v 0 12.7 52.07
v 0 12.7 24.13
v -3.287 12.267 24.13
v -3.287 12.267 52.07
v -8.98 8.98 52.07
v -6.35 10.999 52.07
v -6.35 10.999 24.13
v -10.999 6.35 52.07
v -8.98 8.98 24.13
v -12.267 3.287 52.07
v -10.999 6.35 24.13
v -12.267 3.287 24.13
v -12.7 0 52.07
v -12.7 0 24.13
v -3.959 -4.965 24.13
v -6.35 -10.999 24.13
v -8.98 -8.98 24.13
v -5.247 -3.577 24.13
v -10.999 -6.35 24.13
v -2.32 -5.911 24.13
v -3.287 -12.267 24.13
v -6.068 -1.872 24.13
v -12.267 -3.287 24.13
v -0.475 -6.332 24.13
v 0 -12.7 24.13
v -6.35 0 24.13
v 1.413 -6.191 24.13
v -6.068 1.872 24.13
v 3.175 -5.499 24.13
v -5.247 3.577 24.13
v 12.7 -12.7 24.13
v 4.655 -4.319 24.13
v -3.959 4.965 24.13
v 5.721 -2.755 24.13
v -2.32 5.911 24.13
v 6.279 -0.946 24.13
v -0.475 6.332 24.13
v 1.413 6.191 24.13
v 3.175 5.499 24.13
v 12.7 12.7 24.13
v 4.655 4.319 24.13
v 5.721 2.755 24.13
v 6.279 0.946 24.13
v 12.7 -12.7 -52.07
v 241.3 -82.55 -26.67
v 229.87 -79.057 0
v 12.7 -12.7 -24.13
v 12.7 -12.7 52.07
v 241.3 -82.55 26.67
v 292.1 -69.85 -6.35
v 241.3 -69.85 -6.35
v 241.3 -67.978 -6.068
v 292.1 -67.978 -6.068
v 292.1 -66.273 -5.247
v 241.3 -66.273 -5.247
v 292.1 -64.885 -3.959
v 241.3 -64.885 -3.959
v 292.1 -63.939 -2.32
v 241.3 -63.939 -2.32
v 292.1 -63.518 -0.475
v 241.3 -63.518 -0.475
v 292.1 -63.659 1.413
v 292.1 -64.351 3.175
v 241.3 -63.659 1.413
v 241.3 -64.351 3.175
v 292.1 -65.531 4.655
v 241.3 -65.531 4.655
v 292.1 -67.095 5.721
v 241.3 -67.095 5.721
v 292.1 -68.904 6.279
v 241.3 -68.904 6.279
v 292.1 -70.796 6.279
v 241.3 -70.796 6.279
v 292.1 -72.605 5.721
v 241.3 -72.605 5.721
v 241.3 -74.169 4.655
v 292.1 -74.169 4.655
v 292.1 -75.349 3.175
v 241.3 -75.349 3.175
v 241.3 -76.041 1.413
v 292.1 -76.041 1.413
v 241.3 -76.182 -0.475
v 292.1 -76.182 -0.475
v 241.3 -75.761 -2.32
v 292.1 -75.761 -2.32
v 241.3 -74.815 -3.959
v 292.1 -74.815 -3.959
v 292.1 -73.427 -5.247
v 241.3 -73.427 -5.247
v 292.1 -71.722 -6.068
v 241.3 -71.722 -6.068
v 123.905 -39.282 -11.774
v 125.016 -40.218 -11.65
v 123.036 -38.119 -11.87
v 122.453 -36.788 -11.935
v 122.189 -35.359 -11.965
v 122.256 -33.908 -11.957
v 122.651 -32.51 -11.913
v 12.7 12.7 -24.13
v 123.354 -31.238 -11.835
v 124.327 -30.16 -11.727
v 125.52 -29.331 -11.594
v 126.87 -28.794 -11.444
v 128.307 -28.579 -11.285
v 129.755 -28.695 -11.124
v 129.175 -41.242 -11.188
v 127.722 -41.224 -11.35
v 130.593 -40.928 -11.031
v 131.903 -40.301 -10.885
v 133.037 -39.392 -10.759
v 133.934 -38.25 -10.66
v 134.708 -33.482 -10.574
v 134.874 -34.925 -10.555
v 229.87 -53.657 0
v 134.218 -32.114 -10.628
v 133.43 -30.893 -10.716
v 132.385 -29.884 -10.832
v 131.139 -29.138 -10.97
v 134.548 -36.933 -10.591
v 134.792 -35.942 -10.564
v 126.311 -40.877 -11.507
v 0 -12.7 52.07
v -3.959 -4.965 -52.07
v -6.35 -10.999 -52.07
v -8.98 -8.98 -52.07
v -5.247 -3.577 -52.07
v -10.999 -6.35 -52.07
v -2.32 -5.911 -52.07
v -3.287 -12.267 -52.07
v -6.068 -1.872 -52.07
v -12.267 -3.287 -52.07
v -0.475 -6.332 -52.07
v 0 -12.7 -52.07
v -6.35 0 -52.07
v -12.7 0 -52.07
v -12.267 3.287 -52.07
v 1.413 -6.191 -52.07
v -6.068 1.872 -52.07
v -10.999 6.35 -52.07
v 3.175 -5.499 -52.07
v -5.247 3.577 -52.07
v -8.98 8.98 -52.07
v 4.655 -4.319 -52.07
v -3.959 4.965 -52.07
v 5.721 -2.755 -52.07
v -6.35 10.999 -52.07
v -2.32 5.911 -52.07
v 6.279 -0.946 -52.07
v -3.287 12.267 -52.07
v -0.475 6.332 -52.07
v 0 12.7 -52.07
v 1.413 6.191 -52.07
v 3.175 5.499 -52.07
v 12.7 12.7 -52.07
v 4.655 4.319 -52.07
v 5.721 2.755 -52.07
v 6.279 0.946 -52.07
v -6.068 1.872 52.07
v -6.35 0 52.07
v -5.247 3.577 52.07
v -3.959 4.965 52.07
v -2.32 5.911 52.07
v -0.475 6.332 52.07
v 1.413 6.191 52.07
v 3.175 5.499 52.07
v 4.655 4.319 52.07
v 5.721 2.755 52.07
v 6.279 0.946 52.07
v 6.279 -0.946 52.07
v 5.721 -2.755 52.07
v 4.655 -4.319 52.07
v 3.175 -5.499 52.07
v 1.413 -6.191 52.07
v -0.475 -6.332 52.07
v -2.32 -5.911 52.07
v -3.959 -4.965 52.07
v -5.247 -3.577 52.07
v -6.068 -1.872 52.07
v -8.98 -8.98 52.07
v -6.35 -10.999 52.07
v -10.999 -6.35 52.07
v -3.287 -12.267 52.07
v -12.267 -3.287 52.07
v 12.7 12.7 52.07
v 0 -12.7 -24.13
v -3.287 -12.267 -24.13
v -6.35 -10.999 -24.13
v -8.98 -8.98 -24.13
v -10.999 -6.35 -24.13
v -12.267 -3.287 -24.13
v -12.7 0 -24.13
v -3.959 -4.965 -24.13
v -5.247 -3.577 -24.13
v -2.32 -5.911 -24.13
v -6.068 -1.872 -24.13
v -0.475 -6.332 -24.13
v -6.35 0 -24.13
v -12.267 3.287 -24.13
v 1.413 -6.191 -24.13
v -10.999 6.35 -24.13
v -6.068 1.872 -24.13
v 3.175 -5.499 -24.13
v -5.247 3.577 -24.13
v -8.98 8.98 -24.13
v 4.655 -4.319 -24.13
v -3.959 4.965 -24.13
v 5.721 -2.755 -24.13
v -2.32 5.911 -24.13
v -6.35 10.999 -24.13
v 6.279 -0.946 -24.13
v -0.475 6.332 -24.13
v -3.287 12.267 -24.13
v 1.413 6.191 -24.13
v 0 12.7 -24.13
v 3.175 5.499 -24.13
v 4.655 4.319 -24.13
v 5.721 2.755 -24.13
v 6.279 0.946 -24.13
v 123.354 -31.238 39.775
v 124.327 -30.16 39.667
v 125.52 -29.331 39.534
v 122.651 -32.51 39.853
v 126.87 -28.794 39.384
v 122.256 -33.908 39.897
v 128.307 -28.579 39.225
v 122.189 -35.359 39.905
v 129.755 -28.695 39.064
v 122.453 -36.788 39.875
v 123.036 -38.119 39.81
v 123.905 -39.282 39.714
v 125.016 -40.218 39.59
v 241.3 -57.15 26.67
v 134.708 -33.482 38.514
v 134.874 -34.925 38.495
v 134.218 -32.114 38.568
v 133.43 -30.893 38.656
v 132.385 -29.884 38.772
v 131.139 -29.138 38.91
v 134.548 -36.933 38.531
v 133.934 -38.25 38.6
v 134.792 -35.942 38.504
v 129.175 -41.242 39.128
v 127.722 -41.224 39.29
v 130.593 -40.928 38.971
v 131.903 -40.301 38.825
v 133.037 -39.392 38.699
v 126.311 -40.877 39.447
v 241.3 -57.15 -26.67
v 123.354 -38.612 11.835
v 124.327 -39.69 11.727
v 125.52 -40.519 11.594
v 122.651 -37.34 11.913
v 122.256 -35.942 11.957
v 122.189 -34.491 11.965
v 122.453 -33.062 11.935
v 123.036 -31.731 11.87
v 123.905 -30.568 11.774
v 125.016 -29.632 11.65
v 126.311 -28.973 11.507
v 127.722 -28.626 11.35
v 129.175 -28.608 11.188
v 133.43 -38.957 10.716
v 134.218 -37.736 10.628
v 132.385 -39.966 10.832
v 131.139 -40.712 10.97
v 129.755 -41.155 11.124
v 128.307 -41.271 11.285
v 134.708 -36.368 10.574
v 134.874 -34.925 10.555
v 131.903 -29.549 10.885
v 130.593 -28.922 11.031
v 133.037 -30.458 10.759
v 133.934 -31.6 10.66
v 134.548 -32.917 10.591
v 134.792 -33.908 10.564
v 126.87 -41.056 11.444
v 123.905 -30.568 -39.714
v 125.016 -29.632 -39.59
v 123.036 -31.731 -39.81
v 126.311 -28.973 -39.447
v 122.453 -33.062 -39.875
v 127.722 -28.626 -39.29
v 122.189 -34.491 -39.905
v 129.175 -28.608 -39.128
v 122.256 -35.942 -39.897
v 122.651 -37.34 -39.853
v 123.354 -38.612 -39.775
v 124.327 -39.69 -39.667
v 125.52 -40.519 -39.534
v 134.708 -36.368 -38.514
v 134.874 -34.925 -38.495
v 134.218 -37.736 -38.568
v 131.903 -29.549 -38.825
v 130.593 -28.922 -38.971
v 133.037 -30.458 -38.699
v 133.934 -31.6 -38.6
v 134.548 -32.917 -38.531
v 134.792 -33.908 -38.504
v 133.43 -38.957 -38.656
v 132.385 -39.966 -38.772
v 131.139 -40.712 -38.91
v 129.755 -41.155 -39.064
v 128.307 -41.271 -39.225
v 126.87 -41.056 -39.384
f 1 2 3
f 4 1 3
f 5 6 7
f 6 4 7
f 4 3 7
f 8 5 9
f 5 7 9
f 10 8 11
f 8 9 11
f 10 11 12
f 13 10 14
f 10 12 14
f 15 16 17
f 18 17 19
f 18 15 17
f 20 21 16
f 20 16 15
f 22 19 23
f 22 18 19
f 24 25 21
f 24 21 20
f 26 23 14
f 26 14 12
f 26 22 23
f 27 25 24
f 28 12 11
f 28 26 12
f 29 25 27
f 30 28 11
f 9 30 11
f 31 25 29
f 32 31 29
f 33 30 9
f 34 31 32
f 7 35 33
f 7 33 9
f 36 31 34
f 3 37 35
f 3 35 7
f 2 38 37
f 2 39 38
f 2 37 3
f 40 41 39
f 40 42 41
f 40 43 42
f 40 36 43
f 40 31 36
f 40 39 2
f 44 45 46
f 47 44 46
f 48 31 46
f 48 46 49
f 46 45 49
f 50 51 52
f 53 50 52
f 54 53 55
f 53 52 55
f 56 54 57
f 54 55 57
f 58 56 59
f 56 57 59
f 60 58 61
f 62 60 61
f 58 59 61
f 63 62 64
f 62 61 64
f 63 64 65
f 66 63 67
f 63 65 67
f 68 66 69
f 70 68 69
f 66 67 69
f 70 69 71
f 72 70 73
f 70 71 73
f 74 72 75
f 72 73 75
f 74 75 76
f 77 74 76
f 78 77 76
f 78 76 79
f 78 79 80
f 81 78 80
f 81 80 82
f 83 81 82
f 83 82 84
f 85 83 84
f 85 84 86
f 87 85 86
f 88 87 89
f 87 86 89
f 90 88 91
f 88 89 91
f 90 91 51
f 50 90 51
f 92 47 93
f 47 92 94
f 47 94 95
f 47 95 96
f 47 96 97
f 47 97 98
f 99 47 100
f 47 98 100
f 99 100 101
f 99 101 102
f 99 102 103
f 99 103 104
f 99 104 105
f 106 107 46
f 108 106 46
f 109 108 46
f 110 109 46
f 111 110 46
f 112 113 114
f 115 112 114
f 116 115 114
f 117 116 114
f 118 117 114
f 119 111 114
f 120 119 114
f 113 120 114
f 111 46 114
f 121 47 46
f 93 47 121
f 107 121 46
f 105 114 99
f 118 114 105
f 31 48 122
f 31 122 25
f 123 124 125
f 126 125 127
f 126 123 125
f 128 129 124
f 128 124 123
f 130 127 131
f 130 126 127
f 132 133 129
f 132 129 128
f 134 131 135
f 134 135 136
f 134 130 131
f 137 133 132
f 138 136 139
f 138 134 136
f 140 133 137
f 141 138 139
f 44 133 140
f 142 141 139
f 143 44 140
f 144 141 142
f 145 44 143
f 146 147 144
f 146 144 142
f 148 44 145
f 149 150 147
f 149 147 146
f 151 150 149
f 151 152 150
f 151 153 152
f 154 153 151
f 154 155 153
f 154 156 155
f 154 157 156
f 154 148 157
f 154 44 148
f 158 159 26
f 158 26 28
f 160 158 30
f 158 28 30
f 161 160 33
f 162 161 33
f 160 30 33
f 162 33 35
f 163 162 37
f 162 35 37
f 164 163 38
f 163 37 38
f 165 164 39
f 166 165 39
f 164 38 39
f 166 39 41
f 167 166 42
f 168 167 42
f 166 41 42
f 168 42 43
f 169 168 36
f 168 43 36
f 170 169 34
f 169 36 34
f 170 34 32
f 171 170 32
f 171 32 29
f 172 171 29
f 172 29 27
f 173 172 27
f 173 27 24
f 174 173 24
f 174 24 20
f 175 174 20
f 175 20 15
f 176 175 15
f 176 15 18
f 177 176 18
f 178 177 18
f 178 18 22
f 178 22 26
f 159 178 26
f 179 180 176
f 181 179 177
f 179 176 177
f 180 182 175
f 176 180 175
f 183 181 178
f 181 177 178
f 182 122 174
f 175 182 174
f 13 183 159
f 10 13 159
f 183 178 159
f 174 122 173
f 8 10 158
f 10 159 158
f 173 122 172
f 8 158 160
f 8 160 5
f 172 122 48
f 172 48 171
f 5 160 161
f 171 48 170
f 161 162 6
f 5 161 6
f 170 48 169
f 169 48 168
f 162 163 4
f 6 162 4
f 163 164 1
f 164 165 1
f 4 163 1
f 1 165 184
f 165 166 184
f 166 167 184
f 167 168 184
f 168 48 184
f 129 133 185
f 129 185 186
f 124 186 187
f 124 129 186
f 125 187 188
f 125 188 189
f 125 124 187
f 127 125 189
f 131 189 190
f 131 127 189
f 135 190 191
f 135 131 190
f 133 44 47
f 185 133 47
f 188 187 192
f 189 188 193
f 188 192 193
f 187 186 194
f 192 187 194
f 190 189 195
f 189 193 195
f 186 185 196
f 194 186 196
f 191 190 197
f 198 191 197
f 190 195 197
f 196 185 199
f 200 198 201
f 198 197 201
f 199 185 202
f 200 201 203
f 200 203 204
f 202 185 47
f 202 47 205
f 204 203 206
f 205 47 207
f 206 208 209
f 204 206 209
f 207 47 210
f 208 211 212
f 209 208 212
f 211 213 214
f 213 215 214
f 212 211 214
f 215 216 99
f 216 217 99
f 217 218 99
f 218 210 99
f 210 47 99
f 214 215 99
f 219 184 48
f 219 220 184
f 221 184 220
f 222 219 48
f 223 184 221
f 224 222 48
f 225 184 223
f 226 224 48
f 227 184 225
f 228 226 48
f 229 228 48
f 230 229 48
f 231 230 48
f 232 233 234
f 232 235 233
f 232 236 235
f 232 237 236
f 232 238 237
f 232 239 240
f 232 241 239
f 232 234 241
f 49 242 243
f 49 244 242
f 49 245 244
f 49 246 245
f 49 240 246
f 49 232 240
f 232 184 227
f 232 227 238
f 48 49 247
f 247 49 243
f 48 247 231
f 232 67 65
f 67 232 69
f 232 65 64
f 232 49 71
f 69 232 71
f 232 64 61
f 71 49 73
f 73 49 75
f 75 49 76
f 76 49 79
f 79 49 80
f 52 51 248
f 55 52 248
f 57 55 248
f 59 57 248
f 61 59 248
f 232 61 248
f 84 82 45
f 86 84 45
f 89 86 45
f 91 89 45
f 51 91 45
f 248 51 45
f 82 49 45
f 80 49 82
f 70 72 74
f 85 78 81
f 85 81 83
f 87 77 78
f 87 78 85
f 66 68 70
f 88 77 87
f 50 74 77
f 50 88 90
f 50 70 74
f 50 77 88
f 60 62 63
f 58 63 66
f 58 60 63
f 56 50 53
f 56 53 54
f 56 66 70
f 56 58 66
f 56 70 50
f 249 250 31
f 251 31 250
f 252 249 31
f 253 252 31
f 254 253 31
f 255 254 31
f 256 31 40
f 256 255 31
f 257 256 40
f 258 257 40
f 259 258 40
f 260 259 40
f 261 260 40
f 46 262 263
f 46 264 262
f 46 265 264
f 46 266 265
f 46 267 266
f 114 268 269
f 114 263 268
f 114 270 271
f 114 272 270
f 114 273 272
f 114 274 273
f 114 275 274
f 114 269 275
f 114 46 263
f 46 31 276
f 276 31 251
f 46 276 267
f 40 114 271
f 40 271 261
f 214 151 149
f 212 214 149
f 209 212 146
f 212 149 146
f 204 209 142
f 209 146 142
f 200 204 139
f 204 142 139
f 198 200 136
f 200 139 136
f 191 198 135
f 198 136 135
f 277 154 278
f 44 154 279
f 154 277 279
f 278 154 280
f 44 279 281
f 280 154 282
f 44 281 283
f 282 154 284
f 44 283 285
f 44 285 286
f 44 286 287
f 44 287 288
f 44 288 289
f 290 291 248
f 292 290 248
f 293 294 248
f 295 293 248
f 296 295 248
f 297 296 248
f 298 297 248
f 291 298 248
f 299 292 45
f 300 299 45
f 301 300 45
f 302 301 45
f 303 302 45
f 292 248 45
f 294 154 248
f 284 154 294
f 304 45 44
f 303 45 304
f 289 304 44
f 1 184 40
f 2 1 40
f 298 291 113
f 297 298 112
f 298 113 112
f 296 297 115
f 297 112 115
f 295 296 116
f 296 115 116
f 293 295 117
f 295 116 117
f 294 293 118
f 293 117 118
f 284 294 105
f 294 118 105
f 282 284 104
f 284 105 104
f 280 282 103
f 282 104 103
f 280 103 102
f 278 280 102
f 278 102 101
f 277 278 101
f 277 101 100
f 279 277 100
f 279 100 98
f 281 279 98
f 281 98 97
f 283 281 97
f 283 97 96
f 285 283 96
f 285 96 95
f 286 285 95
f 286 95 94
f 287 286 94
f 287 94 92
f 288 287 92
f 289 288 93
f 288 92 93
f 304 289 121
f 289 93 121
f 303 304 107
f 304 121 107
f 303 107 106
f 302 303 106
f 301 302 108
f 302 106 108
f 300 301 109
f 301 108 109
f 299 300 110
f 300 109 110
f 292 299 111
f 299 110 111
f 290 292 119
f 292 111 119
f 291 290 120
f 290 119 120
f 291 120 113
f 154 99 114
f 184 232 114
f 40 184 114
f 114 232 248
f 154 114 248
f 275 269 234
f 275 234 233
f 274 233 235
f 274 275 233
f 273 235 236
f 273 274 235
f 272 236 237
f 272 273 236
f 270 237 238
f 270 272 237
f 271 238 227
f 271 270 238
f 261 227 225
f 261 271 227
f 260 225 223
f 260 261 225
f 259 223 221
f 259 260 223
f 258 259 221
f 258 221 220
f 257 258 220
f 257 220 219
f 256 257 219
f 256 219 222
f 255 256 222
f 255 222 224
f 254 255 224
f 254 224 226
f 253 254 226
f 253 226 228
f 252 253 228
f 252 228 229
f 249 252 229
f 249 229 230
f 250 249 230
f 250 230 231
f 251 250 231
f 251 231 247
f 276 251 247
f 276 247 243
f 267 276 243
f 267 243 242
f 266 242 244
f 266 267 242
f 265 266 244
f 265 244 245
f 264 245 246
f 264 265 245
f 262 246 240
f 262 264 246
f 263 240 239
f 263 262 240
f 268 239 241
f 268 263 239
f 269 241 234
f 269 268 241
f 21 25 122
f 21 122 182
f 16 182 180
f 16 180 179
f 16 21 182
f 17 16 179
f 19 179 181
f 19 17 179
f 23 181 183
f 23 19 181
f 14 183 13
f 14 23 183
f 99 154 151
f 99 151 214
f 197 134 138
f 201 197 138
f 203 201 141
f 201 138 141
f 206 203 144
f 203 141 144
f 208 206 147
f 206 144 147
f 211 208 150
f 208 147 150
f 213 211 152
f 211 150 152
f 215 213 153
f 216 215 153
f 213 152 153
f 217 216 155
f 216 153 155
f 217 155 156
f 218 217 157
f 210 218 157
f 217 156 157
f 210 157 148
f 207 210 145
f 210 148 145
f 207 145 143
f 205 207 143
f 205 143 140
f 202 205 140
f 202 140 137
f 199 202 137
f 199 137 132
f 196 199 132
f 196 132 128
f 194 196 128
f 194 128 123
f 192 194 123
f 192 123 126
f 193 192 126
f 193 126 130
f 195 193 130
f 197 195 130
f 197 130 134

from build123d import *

# Parameters (mm, degrees)
SKETCH10_W              = 27.94
SKETCH10_H              = 25.4
SKETCH12_W              = 27.94
SKETCH12_H              = 25.4
BOSS_EXTRUDE2_DEPTH     = 25.4
SKETCH13_R              = 6.35
CUT_EXTRUDE4_DEPTH      = 105.14
CUT_EXTRUDE5_DEPTH      = 105.14
SKETCH15_R              = 6.35
BOSS_EXTRUDE3_DEPTH     = 50.8
SKETCH16_R              = 6.35
CUT_EXTRUDE6_DEPTH      = 53.07
CUT_EXTRUDE6_DEPTH_BACK = 53.07


with BuildPart() as part:
    # Sweep3: sweep along a curve in space
    with BuildLine() as sweep3_path:
        Line((12.7, 0, 38.1), (241.3, -69.85, 12.7))
    # Sketch10 → Sweep3 (sweep)
    with BuildSketch(Plane(origin=(12.7, 0, 0), x_dir=(0, 0, -1), z_dir=(1, 0, 0))):
        with Locations((-38.1, 0)):
            Rectangle(SKETCH10_W, SKETCH10_H)
    sweep3 = sweep(path=sweep3_path.line)

    # Sketch12 → Boss-Extrude2 (add)
    with BuildSketch(Plane(origin=(12.7, 0, 0), x_dir=(0, 0, -1), z_dir=(1, 0, 0))):
        with Locations((-38.1, 0)):
            Rectangle(SKETCH12_W, SKETCH12_H)
    boss_extrude2 = extrude(amount=-BOSS_EXTRUDE2_DEPTH)

    # Mirror5: Sweep3, Boss-Extrude2 across plane
    add(sweep3.mirror(Plane.XY))
    add(boss_extrude2.mirror(Plane.XY))

    # Sketch13 → Cut-Extrude4 (cut, through all)
    with BuildSketch(Plane(origin=(0, 0, -52.07), x_dir=(-1, 0, 0), z_dir=(0, 0, -1))):
        Circle(SKETCH13_R)
    extrude(amount=-CUT_EXTRUDE4_DEPTH, mode=Mode.SUBTRACT)

    # Sketch14 → Cut-Extrude5 (cut, through all)
    with BuildSketch(Plane(origin=(0, 0, -52.07), x_dir=(-1, 0, 0), z_dir=(0, 0, -1))):
        with BuildLine():
            Line((12.7, 12.7), (0, 12.7))
            ThreePointArc((0, 12.7), (8.980256121, 8.980256121), (12.7, 0))
            Line((12.7, 0), (12.7, 12.7))
        make_face()
    cut_extrude5 = extrude(amount=-CUT_EXTRUDE5_DEPTH, mode=Mode.SUBTRACT)

    # Mirror6: Cut-Extrude5 across plane
    add(cut_extrude5.mirror(Plane.ZX), mode=Mode.SUBTRACT)

    # Sketch15 → Boss-Extrude3 (add)
    with BuildSketch(Plane(origin=(241.3, 0, 0), x_dir=(0, 0, -1), z_dir=(1, 0, 0))):
        with Locations((0, -69.85)):
            Circle(SKETCH15_R)
    extrude(amount=BOSS_EXTRUDE3_DEPTH)

    # Sketch16 → Cut-Extrude6 (cut, two sides)
    with BuildSketch(Plane.XY) as cut_extrude6_sk:
        with Locations((128.524, -34.925)):
            Circle(SKETCH16_R)
    extrude(amount=CUT_EXTRUDE6_DEPTH, mode=Mode.SUBTRACT)
    extrude(cut_extrude6_sk.sketch, amount=-CUT_EXTRUDE6_DEPTH_BACK, mode=Mode.SUBTRACT)


solid = part.part
